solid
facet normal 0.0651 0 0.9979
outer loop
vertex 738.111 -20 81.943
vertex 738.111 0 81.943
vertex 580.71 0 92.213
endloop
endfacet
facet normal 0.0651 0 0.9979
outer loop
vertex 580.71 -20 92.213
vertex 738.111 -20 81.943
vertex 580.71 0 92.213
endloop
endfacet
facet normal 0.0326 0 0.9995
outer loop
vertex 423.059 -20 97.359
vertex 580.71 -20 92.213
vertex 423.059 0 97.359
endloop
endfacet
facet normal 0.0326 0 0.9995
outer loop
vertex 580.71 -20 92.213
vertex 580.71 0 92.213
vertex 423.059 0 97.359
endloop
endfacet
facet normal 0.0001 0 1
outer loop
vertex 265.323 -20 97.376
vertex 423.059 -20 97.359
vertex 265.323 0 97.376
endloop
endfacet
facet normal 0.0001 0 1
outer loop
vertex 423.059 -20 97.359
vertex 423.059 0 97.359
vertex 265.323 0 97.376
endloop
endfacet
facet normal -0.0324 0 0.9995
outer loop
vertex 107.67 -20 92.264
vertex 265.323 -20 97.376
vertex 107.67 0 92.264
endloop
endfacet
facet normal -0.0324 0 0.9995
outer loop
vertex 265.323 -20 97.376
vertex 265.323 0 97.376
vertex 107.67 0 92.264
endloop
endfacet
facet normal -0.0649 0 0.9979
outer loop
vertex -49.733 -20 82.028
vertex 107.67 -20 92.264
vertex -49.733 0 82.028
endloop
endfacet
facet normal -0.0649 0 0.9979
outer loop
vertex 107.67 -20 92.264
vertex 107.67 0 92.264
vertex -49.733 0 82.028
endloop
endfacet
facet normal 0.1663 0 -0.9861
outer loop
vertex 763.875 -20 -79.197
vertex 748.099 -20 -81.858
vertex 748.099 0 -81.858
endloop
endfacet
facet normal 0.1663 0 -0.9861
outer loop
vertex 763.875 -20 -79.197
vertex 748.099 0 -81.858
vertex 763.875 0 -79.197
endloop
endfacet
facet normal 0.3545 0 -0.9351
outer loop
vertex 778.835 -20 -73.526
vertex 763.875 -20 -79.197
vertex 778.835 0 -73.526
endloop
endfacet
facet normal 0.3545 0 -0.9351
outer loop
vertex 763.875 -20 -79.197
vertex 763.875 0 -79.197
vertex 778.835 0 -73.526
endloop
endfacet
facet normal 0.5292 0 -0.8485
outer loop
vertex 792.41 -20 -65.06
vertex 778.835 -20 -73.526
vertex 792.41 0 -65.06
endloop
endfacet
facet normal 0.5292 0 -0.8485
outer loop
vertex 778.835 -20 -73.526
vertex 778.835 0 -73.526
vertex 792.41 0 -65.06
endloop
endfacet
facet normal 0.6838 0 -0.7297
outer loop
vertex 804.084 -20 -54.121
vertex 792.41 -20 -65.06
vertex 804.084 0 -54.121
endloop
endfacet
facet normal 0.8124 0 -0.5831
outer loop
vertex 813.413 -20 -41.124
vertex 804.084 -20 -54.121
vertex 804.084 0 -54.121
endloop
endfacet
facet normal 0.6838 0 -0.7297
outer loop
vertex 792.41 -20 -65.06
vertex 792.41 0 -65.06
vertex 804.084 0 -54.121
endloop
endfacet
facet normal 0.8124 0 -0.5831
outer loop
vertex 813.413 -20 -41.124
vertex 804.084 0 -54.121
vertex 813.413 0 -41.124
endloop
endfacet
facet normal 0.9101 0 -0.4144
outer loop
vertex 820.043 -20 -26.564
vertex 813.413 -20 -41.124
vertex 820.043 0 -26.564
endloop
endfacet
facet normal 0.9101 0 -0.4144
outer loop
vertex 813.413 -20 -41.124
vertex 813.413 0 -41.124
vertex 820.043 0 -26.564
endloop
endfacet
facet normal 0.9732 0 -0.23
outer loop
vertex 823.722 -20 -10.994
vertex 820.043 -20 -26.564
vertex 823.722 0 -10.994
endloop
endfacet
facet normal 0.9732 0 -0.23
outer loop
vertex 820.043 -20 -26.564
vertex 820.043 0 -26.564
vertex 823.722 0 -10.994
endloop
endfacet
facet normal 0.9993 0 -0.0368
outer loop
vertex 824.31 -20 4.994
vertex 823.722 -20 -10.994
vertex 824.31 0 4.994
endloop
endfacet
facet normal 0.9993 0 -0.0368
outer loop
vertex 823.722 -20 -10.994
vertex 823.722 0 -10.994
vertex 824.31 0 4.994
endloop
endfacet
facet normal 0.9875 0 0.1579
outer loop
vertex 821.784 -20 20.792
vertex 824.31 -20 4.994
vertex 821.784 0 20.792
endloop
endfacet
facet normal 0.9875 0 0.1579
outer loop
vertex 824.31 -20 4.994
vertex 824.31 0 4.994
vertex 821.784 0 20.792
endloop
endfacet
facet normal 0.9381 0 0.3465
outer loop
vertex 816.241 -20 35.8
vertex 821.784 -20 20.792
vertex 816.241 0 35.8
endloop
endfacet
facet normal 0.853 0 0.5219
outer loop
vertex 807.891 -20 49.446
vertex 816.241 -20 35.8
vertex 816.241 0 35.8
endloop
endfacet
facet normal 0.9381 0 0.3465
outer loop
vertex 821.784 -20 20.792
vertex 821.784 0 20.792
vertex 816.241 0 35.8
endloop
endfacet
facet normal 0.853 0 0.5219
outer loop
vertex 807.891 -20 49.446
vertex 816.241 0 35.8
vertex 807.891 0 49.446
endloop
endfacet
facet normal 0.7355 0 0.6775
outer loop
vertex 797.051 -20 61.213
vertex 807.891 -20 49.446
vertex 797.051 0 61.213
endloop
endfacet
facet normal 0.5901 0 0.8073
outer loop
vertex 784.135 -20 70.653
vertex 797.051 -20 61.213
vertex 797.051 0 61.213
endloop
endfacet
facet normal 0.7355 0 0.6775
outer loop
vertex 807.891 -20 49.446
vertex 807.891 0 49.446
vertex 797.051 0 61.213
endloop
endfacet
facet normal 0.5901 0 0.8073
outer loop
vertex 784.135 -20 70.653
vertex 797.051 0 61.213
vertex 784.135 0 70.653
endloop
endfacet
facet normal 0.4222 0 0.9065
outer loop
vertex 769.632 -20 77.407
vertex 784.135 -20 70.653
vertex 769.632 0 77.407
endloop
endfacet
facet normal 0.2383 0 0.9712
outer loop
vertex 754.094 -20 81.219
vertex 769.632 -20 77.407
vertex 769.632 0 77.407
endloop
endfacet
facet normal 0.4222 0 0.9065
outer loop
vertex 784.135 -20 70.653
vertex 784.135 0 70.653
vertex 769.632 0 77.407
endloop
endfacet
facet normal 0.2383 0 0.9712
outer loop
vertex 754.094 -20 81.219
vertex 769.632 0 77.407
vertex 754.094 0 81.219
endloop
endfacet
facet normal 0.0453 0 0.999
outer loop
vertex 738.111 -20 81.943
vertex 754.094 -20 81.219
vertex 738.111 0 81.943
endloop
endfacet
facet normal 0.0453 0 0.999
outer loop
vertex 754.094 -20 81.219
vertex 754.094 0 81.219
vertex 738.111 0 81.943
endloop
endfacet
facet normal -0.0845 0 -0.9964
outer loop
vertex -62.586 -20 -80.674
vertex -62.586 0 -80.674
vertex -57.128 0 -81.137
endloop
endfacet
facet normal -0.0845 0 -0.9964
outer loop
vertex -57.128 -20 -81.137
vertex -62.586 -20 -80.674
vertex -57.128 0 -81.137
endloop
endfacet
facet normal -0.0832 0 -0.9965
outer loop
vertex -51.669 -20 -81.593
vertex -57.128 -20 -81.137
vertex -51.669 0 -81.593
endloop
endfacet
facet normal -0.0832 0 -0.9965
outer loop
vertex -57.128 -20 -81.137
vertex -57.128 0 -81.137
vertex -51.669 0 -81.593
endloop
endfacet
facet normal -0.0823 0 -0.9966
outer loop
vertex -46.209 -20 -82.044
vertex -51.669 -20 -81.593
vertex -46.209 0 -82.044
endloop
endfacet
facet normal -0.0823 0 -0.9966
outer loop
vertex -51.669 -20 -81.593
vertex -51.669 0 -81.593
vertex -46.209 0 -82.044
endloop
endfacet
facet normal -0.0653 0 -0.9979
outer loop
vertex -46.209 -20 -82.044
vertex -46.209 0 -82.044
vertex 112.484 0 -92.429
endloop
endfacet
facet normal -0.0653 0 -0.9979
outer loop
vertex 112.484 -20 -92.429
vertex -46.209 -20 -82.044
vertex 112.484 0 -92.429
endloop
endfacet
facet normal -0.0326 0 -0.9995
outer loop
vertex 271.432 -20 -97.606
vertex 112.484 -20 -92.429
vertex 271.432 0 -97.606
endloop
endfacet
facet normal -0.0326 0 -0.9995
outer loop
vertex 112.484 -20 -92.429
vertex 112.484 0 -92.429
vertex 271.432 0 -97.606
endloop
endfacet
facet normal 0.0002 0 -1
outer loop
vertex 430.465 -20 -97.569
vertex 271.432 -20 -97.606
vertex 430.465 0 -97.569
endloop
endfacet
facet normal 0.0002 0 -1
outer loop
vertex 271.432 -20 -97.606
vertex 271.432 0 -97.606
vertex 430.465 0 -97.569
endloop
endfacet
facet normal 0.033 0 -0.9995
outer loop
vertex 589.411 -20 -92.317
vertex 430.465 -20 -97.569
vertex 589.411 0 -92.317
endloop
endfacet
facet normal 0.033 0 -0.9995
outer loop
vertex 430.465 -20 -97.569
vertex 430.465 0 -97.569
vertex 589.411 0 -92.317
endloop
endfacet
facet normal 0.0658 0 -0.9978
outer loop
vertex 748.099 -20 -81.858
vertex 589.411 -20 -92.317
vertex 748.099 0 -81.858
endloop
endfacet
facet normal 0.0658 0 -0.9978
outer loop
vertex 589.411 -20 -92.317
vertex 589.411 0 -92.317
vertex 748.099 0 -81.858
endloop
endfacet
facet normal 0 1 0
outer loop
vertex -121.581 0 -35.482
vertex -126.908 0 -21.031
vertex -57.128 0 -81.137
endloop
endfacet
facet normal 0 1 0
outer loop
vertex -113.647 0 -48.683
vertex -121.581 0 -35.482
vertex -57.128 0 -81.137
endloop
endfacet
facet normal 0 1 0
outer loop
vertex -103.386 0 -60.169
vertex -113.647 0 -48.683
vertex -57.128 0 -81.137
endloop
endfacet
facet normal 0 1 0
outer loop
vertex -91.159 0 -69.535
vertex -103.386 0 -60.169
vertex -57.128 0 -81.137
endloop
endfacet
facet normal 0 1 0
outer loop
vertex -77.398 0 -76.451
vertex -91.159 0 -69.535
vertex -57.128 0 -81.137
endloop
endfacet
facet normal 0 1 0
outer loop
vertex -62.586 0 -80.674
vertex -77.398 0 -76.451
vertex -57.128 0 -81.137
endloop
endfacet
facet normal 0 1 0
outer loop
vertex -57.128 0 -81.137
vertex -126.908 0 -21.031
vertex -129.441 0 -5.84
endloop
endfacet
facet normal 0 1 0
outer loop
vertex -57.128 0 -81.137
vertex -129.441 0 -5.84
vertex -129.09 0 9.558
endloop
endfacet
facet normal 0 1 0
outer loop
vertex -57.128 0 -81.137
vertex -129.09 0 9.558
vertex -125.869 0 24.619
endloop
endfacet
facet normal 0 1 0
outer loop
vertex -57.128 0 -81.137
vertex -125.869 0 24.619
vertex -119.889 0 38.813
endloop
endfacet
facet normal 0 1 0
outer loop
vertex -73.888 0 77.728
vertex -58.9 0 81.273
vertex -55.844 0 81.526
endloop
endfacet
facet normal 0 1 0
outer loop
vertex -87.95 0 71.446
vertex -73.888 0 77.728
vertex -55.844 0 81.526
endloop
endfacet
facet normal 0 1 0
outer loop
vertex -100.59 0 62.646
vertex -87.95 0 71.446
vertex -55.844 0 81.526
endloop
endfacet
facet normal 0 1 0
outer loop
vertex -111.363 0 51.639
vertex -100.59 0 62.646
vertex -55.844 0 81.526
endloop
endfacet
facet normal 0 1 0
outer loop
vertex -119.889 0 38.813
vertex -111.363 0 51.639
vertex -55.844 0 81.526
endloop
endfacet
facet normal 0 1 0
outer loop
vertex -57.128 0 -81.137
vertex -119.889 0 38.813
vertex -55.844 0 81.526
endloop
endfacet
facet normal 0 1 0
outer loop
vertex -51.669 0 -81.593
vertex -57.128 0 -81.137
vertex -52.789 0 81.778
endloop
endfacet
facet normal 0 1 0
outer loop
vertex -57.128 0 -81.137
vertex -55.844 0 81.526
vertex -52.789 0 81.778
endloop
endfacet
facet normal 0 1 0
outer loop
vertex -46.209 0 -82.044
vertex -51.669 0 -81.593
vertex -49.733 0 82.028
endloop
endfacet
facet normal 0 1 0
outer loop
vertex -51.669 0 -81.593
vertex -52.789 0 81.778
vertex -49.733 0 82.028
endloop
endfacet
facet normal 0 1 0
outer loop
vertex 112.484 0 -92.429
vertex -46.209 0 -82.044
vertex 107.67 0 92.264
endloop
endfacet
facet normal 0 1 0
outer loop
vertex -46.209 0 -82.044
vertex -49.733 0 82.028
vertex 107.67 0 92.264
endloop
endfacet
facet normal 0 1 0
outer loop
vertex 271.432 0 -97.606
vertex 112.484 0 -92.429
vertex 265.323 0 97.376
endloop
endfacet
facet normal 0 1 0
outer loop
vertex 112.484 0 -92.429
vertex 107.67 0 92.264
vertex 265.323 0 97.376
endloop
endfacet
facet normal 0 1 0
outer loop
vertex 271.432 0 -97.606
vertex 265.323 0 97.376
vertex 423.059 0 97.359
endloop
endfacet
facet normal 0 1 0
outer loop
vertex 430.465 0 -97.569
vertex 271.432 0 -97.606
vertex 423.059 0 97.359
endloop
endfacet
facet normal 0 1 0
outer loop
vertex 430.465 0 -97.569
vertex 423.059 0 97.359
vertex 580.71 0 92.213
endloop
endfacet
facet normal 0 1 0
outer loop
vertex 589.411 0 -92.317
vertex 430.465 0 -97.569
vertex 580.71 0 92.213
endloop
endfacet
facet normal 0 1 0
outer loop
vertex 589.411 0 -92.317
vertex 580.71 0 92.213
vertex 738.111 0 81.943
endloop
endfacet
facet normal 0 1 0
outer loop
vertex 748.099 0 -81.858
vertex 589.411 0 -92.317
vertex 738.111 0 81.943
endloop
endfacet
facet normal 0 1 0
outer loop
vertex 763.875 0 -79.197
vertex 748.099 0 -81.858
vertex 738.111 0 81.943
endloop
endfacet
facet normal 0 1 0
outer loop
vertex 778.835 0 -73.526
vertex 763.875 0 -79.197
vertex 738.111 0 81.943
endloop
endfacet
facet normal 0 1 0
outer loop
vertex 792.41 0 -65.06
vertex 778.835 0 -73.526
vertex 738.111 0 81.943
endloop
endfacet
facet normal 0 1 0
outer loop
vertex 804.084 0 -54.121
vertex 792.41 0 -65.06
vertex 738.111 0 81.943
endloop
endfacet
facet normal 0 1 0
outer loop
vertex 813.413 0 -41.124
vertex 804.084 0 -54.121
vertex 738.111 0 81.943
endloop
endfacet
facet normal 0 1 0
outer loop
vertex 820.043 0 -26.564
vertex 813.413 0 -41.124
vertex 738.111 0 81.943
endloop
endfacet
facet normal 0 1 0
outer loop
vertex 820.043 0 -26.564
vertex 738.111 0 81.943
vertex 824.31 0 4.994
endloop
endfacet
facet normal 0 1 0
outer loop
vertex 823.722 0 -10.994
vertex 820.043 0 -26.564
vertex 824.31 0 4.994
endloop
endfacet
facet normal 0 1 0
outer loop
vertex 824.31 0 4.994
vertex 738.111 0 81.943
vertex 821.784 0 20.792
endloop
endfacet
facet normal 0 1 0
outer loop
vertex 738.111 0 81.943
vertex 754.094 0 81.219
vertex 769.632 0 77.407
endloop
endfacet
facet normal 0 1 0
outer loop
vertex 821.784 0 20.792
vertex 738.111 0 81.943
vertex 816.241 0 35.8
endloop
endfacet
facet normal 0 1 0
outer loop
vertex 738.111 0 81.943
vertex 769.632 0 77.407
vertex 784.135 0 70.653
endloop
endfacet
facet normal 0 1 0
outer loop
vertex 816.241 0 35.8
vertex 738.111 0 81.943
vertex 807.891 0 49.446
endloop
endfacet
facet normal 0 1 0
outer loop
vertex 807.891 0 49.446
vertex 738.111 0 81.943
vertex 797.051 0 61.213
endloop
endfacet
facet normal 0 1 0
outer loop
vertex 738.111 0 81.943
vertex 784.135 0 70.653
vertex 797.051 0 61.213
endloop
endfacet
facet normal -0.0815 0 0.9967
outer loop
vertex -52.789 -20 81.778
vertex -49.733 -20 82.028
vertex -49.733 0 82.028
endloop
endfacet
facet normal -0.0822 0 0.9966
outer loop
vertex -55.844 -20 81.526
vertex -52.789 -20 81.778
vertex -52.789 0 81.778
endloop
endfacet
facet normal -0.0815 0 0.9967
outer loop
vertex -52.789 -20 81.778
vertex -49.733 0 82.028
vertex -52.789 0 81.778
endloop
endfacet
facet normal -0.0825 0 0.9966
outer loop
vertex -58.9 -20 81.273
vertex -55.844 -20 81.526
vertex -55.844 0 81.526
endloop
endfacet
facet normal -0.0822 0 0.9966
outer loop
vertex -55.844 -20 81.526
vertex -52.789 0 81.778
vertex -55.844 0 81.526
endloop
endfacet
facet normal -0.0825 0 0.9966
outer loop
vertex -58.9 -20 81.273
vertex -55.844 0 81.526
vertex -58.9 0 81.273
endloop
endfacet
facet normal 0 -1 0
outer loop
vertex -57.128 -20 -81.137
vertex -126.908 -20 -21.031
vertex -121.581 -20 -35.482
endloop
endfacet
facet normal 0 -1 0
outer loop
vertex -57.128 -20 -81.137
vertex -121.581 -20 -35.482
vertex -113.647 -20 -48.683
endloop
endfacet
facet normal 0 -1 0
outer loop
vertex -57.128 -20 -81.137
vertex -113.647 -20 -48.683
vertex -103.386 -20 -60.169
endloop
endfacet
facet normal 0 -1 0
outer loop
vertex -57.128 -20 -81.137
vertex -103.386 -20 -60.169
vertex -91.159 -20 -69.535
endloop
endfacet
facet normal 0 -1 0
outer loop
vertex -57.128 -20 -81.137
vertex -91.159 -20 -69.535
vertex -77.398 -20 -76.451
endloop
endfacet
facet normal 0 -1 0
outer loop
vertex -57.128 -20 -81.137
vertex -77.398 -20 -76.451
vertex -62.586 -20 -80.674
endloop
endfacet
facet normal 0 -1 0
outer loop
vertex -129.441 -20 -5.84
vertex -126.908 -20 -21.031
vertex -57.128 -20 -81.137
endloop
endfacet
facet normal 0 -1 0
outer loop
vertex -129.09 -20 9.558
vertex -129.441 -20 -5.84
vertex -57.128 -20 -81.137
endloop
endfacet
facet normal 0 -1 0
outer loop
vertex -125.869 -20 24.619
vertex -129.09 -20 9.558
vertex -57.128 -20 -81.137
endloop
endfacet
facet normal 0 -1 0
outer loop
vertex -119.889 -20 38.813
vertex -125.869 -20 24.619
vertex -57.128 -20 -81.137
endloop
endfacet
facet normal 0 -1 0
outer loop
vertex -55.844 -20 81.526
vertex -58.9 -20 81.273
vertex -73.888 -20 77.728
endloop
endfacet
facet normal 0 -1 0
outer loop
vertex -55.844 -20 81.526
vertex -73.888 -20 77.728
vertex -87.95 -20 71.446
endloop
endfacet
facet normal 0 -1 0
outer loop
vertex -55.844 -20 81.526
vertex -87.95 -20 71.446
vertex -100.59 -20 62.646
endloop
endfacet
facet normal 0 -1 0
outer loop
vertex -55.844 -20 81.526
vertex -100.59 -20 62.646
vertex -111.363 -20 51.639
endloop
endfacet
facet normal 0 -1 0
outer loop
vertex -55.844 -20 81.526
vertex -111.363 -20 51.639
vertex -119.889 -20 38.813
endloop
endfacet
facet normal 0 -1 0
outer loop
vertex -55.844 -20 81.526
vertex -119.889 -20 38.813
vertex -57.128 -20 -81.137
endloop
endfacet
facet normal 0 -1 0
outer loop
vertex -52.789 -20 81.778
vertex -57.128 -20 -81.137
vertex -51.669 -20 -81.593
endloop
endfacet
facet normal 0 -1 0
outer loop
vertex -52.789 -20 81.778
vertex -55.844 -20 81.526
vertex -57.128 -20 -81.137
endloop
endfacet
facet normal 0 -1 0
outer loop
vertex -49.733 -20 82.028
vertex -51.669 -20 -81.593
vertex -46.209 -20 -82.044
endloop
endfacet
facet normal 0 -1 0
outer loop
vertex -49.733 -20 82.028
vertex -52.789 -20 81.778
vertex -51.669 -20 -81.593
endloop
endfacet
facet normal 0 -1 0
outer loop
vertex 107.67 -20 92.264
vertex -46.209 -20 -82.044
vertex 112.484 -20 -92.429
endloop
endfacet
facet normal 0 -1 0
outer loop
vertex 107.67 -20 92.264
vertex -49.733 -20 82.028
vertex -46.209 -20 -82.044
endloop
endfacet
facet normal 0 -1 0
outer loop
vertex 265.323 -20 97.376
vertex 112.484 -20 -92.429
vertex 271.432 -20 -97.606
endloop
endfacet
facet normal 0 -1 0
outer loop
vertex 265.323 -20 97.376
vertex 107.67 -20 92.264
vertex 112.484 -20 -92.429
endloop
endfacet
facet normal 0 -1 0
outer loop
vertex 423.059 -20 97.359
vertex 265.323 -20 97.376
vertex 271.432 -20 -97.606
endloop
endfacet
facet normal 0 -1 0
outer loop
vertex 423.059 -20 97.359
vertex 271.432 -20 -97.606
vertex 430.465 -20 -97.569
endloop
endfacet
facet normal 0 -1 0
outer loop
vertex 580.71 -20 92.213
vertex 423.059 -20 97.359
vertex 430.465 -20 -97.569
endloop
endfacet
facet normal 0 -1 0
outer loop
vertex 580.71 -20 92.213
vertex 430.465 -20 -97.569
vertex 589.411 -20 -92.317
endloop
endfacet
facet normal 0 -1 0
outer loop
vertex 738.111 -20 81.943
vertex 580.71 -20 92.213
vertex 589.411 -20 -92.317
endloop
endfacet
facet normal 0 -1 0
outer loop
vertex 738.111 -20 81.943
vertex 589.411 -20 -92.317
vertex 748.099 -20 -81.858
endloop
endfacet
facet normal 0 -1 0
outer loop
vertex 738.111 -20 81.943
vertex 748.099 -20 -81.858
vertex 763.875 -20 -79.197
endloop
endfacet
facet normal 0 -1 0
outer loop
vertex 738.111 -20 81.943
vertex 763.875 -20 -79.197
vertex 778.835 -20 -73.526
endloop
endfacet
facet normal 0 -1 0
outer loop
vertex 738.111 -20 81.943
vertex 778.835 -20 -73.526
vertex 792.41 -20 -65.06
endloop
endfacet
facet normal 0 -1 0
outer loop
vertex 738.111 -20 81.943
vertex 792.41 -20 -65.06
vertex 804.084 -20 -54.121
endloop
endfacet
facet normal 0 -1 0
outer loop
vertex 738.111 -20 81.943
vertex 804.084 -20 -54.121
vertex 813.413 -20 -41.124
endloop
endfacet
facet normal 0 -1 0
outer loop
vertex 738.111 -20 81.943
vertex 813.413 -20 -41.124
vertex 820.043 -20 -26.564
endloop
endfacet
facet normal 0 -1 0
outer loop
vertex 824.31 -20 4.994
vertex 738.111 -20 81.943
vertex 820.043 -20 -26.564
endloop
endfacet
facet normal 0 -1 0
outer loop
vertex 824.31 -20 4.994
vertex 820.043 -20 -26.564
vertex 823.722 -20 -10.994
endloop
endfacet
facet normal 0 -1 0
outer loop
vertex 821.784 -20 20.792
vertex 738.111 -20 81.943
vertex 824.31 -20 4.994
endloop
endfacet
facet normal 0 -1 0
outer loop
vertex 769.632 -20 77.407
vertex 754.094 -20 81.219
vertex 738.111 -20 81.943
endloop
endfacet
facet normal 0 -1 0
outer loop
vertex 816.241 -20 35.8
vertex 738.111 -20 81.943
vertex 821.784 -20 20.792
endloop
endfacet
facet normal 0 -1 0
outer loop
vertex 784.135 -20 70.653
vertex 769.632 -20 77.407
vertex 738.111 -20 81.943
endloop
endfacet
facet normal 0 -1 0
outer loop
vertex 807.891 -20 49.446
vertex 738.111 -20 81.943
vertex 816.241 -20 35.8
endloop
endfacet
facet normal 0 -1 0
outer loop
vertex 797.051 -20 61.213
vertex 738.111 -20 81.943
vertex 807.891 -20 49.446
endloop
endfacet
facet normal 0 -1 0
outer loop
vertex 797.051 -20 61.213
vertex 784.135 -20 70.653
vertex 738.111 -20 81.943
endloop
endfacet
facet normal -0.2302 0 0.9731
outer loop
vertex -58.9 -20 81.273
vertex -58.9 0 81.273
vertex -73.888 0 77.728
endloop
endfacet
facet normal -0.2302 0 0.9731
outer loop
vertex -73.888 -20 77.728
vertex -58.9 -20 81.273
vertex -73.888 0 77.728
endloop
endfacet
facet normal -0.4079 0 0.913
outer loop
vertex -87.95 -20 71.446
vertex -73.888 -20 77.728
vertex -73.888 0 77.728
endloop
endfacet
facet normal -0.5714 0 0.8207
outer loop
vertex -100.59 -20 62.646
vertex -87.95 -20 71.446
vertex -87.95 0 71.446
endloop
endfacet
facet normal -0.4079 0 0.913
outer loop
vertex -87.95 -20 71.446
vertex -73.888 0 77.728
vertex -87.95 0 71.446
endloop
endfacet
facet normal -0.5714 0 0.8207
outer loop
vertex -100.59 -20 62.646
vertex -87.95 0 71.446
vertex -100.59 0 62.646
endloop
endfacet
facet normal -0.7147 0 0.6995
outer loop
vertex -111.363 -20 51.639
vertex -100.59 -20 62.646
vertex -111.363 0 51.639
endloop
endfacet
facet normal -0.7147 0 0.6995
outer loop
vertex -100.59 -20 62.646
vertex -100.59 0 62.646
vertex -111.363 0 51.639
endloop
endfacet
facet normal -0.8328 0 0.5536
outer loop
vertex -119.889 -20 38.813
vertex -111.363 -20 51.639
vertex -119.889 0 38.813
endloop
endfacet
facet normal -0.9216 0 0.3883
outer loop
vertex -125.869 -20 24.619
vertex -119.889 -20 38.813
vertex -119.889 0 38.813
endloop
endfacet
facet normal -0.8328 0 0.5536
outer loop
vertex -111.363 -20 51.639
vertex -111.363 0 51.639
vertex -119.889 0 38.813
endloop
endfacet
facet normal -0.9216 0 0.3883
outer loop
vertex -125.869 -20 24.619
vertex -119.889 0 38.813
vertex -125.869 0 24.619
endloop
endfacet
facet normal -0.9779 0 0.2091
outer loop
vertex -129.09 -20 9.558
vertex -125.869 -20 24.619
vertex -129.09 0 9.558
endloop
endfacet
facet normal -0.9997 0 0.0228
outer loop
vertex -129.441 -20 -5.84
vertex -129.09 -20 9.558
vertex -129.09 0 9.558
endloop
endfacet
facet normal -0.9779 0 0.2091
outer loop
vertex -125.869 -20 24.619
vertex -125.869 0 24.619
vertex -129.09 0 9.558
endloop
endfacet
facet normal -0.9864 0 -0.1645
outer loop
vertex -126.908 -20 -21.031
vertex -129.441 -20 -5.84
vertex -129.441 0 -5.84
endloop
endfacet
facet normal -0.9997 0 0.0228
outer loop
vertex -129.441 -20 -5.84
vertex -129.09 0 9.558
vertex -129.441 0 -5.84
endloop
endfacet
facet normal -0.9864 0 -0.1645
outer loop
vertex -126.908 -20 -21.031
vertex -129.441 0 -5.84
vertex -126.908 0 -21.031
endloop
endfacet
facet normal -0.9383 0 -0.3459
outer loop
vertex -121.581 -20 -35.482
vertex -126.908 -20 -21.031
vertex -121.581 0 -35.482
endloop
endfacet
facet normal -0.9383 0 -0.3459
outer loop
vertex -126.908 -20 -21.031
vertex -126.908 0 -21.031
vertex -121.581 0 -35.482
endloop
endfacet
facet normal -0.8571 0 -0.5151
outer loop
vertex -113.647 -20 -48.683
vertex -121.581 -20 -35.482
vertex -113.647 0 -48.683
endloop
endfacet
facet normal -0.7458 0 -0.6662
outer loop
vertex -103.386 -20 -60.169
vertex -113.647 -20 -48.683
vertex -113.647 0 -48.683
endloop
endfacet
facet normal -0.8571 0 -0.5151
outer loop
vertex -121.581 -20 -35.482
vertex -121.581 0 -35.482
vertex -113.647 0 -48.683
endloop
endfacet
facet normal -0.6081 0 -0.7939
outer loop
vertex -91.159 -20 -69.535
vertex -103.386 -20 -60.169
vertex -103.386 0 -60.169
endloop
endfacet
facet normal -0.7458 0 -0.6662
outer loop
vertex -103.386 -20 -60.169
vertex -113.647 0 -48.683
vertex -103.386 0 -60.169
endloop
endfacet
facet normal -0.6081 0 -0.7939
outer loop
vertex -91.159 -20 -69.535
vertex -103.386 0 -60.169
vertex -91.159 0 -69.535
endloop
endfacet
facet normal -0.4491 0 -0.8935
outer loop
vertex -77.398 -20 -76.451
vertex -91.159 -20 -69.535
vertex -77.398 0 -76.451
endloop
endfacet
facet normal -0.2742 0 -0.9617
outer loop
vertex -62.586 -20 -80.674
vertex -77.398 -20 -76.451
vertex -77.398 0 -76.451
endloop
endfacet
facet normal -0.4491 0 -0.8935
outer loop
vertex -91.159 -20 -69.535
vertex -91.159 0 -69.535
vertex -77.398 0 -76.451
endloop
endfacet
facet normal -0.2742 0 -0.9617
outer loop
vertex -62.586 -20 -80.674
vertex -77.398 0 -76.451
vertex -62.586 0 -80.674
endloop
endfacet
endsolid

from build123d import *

# Parameters (mm, degrees)
F1_DEPTH = 20


with BuildPart() as f1:
    # F0 (on Front) → F1 (new body)
    with BuildSketch(Plane.XZ):
        with BuildLine():
            ThreePointArc((-49.7328845509, 82.027652927), (-54.3163875498, 81.6524498366), (-58.8995327156, 81.2729007771))
            ThreePointArc((-58.8995327156, 81.2729007771), (-129.6276844332, 1.8675286407), (-62.5862937495, -80.6741971997))
            ThreePointArc((-62.5862937495, -80.6741971997), (-54.3983095736, -81.3659722205), (-46.209165104, -82.0438736892))
            ThreePointArc((-46.209165104, -82.0438736892), (10.915997147, -57.5305572299), (34.4621609717, 0))
            ThreePointArc((34.4621609717, 0), (9.6672248523, 58.7735942734), (-49.7328845509, 82.027652927))
        make_face()
        with BuildLine():
            ThreePointArc((738.1113483102, 81.9430534241), (344.1909525373, 98.009208707), (-49.7328845509, 82.027652927))
            ThreePointArc((-49.7328845509, 82.027652927), (9.6672248523, 58.7735942734), (34.4621609717, 0))
            Line((34.4621609717, 0), (660.3510609717, 0))
            ThreePointArc((660.3510609717, 0), (682.8853398752, 56.4830202172), (738.1113483102, 81.9430534241))
        make_face()
        with BuildLine():
            ThreePointArc((34.4621609717, 0), (10.915997147, -57.5305572299), (-46.209165104, -82.0438736892))
            ThreePointArc((-46.209165104, -82.0438736892), (350.9486567166, -98.2391856001), (748.0988502502, -81.8578749895))
            ThreePointArc((748.0988502502, -81.8578749895), (686.433253644, -60.0008046218), (660.3510609717, 0))
            Line((660.3510609717, 0), (34.4621609717, 0))
        make_face()
        with BuildLine():
            ThreePointArc((824.4621609717, 0), (798.8896311889, 59.5212710965), (738.1113483102, 81.9430534241))
            ThreePointArc((738.1113483102, 81.9430534241), (682.8853398752, 56.4830202172), (660.3510609717, 0))
            ThreePointArc((660.3510609717, 0), (686.433253644, -60.0008046218), (748.0988502502, -81.8578749895))
            ThreePointArc((748.0988502502, -81.8578749895), (802.4074155935, -55.9733573277), (824.4621609717, 0))
        make_face()
    extrude(amount=F1_DEPTH)


solid = f1.part
